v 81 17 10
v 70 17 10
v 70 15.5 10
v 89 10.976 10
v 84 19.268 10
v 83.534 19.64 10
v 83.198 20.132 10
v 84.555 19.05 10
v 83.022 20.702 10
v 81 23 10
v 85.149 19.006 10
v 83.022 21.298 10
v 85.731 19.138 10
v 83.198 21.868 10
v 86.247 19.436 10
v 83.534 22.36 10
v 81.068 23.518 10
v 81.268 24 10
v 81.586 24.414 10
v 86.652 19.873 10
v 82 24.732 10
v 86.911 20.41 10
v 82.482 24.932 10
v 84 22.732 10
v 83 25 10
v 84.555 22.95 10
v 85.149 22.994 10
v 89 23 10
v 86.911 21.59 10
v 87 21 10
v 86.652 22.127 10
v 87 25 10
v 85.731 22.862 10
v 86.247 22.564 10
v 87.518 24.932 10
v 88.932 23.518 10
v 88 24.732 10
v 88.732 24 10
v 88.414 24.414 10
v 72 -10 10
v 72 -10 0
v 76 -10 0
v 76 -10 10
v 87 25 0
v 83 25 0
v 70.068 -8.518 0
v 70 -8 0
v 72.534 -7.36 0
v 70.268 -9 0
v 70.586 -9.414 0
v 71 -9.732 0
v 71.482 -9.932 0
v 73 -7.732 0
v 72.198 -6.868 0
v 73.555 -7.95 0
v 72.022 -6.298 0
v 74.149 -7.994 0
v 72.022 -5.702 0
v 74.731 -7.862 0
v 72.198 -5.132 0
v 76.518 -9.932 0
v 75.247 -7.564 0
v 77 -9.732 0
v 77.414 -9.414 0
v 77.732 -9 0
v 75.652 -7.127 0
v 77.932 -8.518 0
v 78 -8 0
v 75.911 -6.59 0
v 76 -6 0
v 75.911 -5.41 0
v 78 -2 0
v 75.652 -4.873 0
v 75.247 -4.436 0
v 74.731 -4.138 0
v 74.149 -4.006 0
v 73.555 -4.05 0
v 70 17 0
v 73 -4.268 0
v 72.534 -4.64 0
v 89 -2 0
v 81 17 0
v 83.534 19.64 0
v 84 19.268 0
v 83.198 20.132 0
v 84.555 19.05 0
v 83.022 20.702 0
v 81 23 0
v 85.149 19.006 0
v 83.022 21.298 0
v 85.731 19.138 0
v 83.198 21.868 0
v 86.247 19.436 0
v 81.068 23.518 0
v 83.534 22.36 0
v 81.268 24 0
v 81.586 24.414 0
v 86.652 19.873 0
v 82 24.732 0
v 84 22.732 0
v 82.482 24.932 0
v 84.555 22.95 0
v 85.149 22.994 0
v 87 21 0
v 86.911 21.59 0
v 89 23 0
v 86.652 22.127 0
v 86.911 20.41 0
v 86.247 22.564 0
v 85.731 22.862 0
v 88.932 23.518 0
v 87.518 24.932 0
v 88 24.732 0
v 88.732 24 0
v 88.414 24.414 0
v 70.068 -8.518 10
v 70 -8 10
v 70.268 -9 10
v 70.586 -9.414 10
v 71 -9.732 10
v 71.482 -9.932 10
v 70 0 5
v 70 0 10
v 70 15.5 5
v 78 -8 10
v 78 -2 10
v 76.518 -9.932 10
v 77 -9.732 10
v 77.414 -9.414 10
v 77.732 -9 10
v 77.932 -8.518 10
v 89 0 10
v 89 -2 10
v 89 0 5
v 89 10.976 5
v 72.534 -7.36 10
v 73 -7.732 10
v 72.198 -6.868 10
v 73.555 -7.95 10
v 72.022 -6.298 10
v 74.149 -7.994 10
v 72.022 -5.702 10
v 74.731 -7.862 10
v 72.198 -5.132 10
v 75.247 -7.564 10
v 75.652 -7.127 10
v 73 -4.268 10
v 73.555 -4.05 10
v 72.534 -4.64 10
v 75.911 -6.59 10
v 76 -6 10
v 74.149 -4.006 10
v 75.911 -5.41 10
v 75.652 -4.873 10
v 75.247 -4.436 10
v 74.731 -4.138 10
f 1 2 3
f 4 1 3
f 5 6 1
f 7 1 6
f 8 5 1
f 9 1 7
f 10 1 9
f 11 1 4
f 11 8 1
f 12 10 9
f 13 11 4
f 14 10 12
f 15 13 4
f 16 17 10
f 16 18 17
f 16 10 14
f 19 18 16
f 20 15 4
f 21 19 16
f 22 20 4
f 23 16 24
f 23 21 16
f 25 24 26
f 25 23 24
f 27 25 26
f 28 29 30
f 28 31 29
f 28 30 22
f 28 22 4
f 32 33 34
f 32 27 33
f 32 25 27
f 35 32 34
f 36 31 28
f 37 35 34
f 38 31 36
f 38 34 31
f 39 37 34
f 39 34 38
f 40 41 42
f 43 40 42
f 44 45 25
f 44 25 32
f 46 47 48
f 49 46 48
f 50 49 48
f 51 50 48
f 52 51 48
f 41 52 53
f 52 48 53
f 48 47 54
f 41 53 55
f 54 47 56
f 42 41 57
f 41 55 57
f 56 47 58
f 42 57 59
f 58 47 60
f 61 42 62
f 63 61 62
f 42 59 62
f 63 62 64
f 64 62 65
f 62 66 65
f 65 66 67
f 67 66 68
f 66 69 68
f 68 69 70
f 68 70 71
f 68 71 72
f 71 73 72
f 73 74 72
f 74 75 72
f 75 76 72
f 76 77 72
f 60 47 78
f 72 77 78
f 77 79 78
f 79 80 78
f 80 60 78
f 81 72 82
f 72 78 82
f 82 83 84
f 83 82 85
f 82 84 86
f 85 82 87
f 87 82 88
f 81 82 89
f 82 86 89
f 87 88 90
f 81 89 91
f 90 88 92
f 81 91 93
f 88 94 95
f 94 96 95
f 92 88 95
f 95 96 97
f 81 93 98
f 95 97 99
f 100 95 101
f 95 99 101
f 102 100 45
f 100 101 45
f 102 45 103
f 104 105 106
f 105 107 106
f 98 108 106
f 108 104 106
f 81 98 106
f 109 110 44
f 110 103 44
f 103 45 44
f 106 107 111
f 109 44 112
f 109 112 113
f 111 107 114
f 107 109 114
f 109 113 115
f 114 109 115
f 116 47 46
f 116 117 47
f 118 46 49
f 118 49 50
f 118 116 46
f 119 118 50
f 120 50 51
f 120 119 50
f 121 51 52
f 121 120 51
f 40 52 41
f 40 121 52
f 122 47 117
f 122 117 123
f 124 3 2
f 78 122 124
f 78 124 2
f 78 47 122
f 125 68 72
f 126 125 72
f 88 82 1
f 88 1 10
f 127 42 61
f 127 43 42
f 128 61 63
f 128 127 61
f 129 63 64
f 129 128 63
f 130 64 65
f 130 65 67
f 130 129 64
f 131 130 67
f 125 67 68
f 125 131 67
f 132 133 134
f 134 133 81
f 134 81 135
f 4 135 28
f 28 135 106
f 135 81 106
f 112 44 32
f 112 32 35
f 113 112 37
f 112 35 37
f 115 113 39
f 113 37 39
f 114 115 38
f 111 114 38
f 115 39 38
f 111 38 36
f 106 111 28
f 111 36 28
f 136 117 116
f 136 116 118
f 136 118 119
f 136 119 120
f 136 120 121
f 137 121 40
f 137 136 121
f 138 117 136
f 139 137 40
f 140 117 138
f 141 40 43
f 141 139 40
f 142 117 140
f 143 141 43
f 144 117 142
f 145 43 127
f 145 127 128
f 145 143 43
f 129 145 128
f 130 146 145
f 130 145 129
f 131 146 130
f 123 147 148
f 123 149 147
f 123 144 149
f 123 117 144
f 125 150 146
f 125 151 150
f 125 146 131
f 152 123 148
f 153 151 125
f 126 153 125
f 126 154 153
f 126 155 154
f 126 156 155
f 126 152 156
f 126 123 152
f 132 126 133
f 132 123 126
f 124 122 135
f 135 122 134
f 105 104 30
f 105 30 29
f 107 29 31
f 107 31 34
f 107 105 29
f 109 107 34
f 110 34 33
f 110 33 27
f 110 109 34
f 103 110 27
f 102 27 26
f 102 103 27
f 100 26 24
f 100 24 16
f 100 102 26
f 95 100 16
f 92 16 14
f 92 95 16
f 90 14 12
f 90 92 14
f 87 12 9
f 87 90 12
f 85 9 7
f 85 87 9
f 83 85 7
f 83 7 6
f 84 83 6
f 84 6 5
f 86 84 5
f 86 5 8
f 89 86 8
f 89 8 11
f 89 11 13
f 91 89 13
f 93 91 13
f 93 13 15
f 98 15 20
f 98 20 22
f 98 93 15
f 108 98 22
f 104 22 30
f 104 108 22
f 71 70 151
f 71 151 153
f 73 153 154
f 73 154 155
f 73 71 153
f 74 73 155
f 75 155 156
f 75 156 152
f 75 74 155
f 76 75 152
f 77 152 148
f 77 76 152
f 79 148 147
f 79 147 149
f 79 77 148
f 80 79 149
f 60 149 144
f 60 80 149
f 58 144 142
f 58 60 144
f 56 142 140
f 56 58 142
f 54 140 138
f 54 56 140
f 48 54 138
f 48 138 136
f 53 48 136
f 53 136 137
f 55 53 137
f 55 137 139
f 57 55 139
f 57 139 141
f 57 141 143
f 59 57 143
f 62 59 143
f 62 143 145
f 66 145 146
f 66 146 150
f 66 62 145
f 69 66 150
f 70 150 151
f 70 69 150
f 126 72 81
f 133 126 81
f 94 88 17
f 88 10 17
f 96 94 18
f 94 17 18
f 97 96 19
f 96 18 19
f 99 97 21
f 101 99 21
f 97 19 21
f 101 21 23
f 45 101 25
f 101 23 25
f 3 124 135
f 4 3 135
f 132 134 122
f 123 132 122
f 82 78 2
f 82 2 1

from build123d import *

# Parameters (mm, degrees)
CYLINDER006_R     = 2
CYLINDER006_DEPTH = 10
BOX005_W          = 8
BOX005_H          = 8
BOX005_DEPTH      = 10
FILLET002_R       = 2
CYLINDER007_R     = 2
CYLINDER007_DEPTH = 10
BOX006_W          = 8
BOX006_H          = 8
BOX006_DEPTH      = 10
FILLET003_R       = 2
PAD002_DEPTH      = 5
BOX002_W          = 19
BOX002_H          = 19
BOX002_DEPTH      = 10


with BuildPart() as cylinder006:
    # Cylinder006 → Cylinder006 (new body)
    with BuildSketch(Plane(origin=(4, 4, 0), x_dir=(1, 0, 0), z_dir=(0, 0, 1))):
        Circle(CYLINDER006_R)
    extrude(amount=CYLINDER006_DEPTH)


with BuildPart() as fillet002:
    # Box005 → Box005 (new body)
    with BuildSketch(Plane.XY):
        with Locations((4, 4)):
            Rectangle(BOX005_W, BOX005_H)
    extrude(amount=BOX005_DEPTH)

    # Cut006: cut Cylinder006
    add(cylinder006.part, mode=Mode.SUBTRACT)


with BuildPart() as fillet002_1:
    # Cut006 placement: moved
    add(fillet002.part.moved(Location((30, -10, 0))))

    # Fillet002
    fillet002_edges = [fillet002_1.edges().sort_by_distance(p)[0] for p in [
        (30, -10, 5),
        (38, -10, 5),
    ]]
    fillet(fillet002_edges, radius=FILLET002_R)


with BuildPart() as fillet002_2:
    # Fillet002 placement: moved
    add(fillet002_1.part.moved(Location((40, 0, 0))))


with BuildPart() as cylinder007:
    # Cylinder007 → Cylinder007 (new body)
    with BuildSketch(Plane(origin=(4, 4, 0), x_dir=(1, 0, 0), z_dir=(0, 0, 1))):
        Circle(CYLINDER007_R)
    extrude(amount=CYLINDER007_DEPTH)


with BuildPart() as fillet003:
    # Box006 → Box006 (new body)
    with BuildSketch(Plane.XY):
        with Locations((4, 4)):
            Rectangle(BOX006_W, BOX006_H)
    extrude(amount=BOX006_DEPTH)

    # Cut007: cut Cylinder007
    add(cylinder007.part, mode=Mode.SUBTRACT)


with BuildPart() as fillet003_1:
    # Cut007 placement: moved
    add(fillet003.part.moved(Location((45, 14, 0))))

    # Fillet003
    fillet003_edges = [fillet003_1.edges().sort_by_distance(p)[0] for p in [
        (45, 22, 5),
        (53, 22, 5),
    ]]
    fillet(fillet003_edges, radius=FILLET003_R)


with BuildPart() as fillet003_2:
    # Fillet003 placement: moved
    add(fillet003_1.part.moved(Location((36, 3, 0))))


with BuildPart() as f_300mmbody:
    # Sketch002 → Pad002 (new body)
    with BuildSketch(Plane(origin=(0, 0, 0), x_dir=(-1, 0, 0), z_dir=(0, 0, 1))):
        Polygon((-70, 0), (-70, -15.5), (-101.5, -8), (-101.5, 0), align=None)
    extrude(amount=PAD002_DEPTH)


with BuildPart() as f_300mmbody_1:
    # Body002 placement: moved
    add(f_300mmbody.part.moved(Location((0, 0, 5))))


with BuildPart() as f_300mmholder:
    # Box002 → Box002 (new body)
    with BuildSketch(Plane(origin=(70, -2, 0), x_dir=(1, 0, 0), z_dir=(0, 0, 1))):
        with Locations((9.5, 9.5)):
            Rectangle(BOX002_W, BOX002_H)
    extrude(amount=BOX002_DEPTH)

    # Cut002: cut 300mmBody
    add(f_300mmbody_1.part, mode=Mode.SUBTRACT)

    # Fusion001: union Fillet002, Fillet003
    add(fillet002_2.part)
    add(fillet003_2.part)


solid = f_300mmholder.part
